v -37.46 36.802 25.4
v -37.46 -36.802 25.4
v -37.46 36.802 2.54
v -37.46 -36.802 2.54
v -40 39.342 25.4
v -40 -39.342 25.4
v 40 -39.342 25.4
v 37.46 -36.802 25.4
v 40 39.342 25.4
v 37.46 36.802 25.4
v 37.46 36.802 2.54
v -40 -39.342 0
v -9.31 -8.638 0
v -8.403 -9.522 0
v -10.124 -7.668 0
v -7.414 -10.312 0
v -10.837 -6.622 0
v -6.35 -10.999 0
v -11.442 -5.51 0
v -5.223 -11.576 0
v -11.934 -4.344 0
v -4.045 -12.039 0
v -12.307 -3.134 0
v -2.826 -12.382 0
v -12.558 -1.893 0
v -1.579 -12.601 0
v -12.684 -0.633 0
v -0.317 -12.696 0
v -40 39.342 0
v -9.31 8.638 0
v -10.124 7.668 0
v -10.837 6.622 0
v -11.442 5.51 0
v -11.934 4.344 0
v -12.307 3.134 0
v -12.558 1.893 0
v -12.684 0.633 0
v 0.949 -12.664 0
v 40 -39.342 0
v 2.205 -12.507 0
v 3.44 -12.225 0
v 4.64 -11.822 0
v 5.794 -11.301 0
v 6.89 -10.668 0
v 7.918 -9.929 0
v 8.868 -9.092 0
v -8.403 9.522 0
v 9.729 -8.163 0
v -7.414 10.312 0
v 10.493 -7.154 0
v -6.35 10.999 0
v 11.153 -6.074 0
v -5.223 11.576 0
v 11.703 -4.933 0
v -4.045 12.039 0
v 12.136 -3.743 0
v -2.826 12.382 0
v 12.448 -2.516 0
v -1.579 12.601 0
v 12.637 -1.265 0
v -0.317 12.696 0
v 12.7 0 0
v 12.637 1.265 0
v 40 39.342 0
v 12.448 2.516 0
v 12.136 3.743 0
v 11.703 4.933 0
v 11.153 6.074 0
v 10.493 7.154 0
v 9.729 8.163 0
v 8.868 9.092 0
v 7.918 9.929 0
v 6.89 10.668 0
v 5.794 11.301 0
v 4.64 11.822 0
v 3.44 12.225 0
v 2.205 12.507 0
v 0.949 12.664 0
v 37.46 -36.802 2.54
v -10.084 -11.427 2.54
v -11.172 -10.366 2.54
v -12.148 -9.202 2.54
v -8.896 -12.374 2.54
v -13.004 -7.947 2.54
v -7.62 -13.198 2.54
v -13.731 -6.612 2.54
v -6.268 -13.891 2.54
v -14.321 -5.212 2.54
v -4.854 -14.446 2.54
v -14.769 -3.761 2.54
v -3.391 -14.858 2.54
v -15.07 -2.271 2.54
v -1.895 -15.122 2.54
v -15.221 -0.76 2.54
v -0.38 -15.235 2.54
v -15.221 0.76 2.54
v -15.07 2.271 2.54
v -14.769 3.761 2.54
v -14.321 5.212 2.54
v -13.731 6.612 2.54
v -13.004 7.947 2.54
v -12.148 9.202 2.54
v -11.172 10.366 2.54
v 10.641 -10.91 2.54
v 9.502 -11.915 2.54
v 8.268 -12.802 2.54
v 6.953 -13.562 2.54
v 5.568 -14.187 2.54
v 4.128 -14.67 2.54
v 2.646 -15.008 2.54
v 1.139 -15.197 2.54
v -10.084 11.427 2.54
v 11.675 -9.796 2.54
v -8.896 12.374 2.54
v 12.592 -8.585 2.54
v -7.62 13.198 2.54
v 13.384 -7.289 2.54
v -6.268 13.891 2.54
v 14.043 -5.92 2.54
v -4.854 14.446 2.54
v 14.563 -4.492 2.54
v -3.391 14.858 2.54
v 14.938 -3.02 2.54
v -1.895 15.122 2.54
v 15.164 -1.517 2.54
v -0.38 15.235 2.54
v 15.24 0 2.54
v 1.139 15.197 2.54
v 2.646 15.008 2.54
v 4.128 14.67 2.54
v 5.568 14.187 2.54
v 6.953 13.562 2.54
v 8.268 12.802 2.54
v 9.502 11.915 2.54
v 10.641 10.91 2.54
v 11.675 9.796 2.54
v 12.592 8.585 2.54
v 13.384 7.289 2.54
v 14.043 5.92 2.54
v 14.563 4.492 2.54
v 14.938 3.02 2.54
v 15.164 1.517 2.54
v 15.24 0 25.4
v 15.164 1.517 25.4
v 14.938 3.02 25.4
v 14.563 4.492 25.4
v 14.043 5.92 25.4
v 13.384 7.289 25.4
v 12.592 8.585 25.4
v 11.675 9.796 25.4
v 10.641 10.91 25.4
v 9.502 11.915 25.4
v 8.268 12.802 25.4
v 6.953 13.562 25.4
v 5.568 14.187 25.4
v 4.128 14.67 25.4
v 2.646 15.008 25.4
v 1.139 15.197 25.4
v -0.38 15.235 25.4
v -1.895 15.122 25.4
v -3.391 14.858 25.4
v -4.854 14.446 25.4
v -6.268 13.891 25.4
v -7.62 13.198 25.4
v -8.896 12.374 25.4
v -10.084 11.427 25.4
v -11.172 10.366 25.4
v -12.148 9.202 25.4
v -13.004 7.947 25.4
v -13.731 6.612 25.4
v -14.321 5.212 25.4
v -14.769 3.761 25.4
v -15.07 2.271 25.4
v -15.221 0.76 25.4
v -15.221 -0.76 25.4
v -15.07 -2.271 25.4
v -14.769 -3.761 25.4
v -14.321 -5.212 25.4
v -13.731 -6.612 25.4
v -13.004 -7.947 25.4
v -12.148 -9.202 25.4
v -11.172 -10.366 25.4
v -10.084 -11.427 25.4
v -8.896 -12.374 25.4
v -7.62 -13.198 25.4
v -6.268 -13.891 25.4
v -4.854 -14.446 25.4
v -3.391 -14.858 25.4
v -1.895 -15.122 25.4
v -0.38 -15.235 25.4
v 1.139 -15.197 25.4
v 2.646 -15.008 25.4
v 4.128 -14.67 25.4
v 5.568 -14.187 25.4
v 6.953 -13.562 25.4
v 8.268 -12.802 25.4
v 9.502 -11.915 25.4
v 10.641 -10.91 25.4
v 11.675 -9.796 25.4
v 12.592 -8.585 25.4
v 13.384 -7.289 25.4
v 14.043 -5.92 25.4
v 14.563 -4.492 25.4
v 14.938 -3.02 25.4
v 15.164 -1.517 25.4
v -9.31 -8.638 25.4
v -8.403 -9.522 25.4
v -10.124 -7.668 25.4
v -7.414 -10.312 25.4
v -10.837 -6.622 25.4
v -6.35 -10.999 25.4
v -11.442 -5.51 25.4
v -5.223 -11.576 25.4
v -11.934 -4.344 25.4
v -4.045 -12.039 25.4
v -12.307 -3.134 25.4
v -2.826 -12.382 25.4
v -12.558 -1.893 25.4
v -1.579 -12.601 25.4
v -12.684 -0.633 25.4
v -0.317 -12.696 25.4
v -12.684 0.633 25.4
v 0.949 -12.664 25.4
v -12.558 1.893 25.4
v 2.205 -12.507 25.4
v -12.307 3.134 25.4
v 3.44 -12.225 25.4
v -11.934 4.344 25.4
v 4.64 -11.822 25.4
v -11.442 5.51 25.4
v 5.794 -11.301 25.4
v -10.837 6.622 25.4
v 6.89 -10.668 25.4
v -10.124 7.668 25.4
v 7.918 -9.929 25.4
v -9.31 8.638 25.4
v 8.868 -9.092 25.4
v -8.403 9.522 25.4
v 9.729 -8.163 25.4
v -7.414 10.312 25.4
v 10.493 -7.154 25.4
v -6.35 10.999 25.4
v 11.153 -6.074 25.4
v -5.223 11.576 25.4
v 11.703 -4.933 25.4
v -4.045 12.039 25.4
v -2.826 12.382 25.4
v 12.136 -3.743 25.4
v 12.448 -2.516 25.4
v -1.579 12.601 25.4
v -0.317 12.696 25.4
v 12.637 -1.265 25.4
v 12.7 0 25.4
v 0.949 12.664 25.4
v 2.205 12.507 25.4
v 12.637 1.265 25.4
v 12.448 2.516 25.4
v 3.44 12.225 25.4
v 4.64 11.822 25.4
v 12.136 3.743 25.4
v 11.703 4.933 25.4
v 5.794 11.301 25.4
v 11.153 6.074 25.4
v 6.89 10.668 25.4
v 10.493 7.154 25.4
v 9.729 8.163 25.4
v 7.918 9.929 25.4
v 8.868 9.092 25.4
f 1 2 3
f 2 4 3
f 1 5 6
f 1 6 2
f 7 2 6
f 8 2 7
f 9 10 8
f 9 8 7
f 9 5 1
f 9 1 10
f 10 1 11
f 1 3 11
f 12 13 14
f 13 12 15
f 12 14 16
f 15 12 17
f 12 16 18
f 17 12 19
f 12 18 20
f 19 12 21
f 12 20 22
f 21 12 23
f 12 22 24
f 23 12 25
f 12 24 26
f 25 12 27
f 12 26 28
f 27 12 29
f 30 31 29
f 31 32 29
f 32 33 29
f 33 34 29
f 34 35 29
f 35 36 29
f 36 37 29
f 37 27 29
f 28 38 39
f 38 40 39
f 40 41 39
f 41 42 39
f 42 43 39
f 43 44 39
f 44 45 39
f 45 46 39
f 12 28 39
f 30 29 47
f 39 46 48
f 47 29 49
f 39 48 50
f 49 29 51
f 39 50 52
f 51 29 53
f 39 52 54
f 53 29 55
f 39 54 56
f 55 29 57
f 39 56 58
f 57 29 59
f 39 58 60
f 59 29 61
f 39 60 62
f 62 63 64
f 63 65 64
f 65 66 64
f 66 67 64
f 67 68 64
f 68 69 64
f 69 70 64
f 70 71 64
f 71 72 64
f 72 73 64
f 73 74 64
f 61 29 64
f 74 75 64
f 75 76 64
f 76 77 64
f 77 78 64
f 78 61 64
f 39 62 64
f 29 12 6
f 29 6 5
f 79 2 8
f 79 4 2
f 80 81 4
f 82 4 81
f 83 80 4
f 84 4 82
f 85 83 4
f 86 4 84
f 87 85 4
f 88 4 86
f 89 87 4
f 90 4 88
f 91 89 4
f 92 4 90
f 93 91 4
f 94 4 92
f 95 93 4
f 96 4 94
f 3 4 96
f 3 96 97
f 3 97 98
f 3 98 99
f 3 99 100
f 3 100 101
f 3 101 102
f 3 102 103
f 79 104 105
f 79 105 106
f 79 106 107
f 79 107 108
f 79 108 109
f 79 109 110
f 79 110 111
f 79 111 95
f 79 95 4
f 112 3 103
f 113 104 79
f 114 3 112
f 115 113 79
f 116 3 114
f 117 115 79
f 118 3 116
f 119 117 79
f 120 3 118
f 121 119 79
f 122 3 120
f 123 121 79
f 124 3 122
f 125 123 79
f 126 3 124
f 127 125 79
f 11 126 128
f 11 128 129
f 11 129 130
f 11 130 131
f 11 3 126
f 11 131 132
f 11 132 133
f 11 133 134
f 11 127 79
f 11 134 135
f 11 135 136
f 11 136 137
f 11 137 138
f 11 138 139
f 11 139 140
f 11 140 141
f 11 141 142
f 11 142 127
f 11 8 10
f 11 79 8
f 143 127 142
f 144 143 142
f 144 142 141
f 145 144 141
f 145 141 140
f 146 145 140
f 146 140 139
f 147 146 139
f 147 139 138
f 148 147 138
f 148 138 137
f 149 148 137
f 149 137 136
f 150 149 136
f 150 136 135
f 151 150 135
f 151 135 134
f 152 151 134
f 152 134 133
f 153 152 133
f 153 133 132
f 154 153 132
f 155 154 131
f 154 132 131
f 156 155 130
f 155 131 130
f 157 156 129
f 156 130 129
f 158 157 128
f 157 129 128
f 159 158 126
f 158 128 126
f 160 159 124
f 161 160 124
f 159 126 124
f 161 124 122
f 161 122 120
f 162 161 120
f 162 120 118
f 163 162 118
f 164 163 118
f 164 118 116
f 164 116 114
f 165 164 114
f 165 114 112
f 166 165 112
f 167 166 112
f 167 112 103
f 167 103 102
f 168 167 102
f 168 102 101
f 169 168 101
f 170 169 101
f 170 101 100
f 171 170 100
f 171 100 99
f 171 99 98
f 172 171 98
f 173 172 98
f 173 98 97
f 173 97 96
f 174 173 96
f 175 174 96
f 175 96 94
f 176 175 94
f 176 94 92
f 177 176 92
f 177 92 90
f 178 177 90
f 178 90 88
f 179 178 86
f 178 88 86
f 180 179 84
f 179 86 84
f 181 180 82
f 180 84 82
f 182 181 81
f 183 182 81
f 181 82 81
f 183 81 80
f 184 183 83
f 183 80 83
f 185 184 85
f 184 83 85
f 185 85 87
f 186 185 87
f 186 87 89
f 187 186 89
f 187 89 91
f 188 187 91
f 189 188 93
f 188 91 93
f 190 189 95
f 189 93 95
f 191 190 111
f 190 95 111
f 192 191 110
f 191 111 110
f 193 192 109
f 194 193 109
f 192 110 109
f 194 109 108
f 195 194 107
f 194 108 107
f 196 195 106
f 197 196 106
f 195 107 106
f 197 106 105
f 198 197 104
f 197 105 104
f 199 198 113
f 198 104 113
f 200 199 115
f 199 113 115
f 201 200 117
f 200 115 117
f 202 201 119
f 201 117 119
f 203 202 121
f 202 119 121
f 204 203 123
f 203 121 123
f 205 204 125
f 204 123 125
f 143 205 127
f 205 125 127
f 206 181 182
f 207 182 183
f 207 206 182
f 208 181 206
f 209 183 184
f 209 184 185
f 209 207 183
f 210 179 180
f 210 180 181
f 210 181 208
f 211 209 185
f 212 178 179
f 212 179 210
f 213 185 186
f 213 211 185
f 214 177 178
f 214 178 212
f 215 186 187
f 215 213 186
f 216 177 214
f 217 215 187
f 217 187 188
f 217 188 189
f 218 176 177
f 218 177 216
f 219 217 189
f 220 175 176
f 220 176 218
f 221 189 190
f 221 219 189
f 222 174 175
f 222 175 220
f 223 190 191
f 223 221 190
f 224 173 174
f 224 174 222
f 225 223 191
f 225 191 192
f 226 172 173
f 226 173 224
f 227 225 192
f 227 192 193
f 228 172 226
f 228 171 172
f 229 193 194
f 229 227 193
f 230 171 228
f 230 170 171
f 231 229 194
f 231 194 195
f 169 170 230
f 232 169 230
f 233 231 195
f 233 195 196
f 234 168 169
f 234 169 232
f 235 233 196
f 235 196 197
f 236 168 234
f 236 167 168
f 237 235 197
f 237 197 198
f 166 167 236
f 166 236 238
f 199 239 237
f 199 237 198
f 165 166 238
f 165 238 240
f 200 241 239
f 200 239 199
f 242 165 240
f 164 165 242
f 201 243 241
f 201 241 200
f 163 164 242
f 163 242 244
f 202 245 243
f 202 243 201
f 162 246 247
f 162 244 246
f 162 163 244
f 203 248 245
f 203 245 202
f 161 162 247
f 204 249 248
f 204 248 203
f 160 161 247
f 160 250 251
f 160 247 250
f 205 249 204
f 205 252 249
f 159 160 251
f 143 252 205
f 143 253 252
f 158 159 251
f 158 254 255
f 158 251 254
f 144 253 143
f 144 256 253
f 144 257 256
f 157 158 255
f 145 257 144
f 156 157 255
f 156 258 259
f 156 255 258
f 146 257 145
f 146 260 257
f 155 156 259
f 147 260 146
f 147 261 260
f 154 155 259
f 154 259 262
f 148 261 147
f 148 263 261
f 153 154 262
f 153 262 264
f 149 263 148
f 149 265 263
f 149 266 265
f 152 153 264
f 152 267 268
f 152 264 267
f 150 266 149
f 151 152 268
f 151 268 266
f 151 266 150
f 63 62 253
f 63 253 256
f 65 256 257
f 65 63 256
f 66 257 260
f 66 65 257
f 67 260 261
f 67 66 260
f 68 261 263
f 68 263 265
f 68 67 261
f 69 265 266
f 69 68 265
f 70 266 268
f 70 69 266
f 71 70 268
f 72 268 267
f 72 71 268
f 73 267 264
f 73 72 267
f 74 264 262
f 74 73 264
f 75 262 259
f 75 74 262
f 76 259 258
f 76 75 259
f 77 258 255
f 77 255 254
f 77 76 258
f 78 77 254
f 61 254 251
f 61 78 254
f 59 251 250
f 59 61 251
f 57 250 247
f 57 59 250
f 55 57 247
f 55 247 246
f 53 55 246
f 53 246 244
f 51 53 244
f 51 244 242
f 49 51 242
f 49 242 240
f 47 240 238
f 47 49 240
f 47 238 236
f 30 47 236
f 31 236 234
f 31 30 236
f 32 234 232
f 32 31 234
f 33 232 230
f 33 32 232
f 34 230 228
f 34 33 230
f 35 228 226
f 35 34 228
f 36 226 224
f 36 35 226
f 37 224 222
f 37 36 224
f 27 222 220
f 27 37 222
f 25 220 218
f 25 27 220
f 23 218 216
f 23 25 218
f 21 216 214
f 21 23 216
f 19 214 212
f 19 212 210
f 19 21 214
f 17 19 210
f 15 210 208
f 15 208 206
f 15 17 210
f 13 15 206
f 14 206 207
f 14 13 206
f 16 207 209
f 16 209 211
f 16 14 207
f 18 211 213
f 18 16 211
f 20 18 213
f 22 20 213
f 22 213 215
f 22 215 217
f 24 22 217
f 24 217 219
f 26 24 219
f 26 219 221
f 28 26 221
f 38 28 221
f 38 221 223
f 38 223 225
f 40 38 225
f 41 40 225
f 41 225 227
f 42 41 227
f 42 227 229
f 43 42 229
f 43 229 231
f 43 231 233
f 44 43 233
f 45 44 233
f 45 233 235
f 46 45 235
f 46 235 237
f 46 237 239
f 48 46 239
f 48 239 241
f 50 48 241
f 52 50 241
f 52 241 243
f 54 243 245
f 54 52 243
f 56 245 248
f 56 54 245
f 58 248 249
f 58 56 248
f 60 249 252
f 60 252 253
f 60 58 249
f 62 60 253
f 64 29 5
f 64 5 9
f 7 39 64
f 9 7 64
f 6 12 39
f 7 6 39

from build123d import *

# Parameters (mm, degrees)
F1_W     = 80
F1_H     = 78.6831277681
F1_R     = 12.7
F2_DEPTH = 25.4
F3_T     = -2.54


with BuildPart() as f2:
    # F1 (on face) → F2 (new body)
    with BuildSketch(Plane.XY):
        Rectangle(F1_W, F1_H)
        Circle(F1_R, mode=Mode.SUBTRACT)
    extrude(amount=F2_DEPTH)

    # F3
    f3_openings = [f2.faces().sort_by_distance(p)[0] for p in [
        (38.877902, 0, 25.4),
    ]]
    offset(amount=F3_T, openings=f3_openings)


solid = f2.part
